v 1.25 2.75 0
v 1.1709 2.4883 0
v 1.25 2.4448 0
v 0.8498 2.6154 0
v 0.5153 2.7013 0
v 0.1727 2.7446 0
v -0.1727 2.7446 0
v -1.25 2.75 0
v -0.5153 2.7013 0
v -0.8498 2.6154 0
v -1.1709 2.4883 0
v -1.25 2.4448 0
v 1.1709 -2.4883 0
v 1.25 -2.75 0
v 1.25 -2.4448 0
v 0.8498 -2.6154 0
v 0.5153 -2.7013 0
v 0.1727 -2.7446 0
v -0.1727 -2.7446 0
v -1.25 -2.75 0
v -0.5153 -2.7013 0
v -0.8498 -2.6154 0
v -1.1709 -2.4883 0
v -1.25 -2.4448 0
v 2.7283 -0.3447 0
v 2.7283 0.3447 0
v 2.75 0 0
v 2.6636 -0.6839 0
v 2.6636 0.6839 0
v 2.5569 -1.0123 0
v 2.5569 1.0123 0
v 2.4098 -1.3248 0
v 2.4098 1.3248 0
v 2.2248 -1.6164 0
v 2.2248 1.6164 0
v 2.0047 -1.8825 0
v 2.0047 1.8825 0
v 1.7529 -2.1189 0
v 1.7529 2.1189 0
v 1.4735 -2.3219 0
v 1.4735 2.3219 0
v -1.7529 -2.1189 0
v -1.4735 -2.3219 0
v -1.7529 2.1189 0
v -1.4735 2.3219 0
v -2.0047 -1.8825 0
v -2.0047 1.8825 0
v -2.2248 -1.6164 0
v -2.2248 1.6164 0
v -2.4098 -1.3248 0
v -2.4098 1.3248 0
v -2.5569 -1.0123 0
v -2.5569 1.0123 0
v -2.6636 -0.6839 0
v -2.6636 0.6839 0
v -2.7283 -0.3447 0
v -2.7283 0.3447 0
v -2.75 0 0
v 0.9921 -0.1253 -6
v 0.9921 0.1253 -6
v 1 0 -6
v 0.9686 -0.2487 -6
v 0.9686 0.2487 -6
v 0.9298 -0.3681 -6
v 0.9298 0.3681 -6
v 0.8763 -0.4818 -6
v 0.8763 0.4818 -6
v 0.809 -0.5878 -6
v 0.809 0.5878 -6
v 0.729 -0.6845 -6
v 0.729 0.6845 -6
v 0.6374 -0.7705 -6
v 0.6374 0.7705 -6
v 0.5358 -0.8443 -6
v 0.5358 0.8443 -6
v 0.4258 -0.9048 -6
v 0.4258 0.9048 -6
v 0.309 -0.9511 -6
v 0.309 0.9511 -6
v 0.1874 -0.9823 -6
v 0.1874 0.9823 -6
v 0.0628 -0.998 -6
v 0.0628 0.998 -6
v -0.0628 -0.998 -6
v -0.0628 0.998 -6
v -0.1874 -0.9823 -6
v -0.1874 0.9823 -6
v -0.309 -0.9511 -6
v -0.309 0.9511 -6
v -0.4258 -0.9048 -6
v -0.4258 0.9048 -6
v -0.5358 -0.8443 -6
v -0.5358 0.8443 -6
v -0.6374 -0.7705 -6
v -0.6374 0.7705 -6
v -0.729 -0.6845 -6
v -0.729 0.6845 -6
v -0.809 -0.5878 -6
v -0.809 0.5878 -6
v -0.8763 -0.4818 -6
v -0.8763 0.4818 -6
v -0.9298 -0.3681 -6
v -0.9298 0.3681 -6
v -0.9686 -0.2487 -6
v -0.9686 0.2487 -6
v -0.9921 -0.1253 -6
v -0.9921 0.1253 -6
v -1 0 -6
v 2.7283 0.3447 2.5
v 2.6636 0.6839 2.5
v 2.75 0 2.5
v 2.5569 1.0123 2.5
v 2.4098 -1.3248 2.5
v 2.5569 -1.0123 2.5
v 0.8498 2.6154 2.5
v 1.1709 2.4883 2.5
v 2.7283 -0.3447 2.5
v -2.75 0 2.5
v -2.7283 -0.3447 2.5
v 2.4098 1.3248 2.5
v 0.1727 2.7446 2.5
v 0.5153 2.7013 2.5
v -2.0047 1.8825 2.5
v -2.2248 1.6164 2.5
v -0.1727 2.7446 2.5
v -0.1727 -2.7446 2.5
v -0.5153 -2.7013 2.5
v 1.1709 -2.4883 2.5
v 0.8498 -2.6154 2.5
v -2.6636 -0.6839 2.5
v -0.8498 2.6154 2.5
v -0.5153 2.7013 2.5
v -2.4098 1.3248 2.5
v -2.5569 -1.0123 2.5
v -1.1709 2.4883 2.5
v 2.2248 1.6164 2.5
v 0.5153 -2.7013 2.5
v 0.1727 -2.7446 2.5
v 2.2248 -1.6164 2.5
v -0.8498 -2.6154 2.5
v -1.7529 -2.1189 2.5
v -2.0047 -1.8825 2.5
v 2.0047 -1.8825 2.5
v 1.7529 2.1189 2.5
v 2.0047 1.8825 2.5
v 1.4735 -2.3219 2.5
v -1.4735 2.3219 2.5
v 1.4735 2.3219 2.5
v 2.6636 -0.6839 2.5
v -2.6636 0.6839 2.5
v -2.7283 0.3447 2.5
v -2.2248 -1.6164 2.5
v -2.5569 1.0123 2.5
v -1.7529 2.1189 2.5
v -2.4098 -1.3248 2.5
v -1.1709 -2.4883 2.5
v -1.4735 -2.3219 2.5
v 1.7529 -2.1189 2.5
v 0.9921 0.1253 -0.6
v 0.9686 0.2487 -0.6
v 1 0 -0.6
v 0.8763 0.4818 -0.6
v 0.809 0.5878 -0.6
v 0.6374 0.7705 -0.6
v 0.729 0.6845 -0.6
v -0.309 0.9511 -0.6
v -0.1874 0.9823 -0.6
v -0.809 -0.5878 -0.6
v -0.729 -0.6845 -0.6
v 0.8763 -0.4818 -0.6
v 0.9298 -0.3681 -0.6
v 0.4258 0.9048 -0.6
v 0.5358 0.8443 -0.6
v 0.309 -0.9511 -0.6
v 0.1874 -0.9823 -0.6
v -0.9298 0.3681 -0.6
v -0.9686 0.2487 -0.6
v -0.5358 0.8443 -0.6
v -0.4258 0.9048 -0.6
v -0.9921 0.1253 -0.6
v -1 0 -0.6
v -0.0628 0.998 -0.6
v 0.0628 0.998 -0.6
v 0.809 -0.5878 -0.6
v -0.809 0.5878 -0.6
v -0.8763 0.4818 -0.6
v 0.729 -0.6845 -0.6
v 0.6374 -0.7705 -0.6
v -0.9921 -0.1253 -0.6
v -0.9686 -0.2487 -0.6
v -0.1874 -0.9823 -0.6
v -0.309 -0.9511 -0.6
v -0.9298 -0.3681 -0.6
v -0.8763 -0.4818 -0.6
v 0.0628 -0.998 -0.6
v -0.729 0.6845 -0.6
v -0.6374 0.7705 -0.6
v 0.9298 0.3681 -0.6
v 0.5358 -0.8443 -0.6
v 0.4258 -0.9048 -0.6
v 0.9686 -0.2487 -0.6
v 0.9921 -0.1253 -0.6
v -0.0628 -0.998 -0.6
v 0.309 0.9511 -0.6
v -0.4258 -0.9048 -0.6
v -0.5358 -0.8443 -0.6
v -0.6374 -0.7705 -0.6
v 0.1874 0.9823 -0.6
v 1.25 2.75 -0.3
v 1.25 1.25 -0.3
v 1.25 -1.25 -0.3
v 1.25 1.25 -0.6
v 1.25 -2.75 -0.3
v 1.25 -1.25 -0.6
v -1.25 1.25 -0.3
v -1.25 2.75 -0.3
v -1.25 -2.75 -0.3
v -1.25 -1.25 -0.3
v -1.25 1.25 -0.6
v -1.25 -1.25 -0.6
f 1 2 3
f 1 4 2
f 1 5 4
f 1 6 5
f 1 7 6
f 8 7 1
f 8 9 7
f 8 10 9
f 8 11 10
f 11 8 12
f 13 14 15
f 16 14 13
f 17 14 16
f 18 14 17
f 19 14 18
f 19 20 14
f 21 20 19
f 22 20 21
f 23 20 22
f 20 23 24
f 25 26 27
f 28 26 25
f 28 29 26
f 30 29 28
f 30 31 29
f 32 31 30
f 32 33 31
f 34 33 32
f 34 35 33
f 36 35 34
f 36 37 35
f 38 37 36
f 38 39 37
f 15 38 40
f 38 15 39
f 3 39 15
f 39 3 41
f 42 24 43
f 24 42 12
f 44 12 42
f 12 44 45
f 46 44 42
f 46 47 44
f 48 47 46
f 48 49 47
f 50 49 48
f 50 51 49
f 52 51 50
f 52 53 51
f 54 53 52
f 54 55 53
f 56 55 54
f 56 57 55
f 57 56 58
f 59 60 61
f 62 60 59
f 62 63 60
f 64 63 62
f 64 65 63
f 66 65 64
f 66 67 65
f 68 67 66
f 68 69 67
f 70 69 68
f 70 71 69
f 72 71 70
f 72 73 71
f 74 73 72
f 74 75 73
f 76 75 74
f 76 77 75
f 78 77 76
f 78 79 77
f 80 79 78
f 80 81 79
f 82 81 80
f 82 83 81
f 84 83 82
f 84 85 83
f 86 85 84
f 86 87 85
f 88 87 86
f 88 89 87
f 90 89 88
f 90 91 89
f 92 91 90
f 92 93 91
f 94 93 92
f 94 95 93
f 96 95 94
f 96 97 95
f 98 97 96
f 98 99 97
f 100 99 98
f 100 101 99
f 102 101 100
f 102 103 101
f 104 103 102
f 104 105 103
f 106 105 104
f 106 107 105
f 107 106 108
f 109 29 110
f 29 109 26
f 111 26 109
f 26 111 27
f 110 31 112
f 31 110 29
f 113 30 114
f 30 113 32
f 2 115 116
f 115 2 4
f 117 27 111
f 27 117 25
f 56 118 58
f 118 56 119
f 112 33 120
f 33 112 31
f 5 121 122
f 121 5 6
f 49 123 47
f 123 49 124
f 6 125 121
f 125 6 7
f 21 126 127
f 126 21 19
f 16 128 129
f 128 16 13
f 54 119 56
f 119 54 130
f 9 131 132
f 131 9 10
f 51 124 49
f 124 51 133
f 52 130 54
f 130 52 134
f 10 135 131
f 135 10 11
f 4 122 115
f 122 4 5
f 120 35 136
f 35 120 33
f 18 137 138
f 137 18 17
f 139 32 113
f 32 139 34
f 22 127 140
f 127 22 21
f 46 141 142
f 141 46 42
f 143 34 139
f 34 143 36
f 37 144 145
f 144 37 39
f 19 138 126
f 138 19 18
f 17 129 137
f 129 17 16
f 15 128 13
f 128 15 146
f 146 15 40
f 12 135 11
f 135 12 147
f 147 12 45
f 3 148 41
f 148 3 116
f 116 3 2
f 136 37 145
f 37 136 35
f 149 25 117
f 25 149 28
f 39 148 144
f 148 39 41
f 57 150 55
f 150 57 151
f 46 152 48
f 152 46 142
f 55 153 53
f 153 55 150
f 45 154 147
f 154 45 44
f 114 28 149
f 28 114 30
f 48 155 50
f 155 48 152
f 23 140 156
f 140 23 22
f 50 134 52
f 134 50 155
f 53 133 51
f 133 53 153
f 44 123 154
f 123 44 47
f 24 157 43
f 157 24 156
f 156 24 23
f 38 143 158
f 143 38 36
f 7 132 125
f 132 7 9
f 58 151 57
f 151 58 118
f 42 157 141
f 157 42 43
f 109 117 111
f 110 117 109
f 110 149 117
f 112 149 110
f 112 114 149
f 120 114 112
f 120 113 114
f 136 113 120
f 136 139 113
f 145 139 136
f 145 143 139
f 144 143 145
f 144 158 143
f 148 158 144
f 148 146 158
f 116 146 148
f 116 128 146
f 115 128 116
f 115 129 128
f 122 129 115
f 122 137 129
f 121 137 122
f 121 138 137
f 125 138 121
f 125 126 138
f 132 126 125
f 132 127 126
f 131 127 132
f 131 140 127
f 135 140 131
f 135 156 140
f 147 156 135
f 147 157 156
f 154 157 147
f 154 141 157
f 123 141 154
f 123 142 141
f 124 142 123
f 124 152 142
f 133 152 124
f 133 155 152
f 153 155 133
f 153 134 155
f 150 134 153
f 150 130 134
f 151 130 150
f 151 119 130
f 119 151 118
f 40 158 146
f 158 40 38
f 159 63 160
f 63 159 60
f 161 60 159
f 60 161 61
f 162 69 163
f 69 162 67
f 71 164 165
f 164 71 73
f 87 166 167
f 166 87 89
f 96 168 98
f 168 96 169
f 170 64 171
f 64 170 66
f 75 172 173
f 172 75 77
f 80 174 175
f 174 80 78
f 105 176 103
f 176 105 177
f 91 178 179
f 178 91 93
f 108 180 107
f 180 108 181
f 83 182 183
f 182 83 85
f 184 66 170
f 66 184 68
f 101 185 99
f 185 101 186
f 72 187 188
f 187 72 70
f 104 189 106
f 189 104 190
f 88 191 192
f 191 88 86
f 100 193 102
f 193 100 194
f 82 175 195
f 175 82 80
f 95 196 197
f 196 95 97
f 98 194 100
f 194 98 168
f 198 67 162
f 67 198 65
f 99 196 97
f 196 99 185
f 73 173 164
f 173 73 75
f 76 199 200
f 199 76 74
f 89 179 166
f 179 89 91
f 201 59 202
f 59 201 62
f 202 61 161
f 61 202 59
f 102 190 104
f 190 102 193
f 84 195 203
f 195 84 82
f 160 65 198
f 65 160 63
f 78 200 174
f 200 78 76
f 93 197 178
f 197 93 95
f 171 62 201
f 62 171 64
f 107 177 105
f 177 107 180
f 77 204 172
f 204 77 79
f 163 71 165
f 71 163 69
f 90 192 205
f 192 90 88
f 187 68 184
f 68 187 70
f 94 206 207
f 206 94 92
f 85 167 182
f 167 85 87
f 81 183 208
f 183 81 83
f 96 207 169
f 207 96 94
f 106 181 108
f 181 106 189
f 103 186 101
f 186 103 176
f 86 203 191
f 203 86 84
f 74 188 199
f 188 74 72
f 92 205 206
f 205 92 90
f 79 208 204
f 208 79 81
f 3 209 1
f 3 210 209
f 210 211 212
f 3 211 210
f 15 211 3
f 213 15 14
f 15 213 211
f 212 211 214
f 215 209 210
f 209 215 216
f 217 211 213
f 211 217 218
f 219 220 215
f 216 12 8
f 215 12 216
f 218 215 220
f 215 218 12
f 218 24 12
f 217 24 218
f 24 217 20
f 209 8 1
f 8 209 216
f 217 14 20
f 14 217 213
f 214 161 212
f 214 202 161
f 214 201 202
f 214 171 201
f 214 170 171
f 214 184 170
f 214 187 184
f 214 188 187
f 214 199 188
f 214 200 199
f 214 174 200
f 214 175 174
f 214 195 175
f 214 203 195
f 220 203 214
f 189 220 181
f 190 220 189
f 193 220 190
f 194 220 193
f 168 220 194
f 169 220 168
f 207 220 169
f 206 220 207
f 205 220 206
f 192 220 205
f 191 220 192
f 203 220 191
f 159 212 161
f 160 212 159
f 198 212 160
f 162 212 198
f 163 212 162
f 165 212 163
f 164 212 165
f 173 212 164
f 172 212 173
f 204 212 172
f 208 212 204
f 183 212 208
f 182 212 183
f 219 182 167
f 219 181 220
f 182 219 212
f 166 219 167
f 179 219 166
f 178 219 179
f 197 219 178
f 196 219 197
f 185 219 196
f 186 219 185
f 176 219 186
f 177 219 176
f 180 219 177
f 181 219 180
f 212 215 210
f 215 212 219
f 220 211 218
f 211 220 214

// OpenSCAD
$fn = 50;


difference() {
	union() {
		translate(v = [0, 0, 0]) {
			rotate(a = [0, 0, 0]) {
				difference() {
					union() {
						translate(v = [0, 0, -6.0000000000]) {
							cylinder(h = 6, r = 0.7500000000);
						}
						cylinder(h = 2.5000000000, r = 2.7500000000);
						translate(v = [0, 0, -6.0000000000]) {
							cylinder(h = 6, r = 1.0000000000);
						}
						translate(v = [-1.2500000000, -2.7500000000, -0.3000000000]) {
							cube(size = [2.5000000000, 5.5000000000, 0.3000000000]);
						}
						translate(v = [-1.2500000000, -1.2500000000, -0.6000000000]) {
							cube(size = [2.5000000000, 2.5000000000, 0.3000000000]);
						}
						translate(v = [0, 0, -6.0000000000]) {
							cylinder(h = 6, r = 0.7500000000);
						}
					}
					union();
				}
			}
		}
	}
	union();
}
